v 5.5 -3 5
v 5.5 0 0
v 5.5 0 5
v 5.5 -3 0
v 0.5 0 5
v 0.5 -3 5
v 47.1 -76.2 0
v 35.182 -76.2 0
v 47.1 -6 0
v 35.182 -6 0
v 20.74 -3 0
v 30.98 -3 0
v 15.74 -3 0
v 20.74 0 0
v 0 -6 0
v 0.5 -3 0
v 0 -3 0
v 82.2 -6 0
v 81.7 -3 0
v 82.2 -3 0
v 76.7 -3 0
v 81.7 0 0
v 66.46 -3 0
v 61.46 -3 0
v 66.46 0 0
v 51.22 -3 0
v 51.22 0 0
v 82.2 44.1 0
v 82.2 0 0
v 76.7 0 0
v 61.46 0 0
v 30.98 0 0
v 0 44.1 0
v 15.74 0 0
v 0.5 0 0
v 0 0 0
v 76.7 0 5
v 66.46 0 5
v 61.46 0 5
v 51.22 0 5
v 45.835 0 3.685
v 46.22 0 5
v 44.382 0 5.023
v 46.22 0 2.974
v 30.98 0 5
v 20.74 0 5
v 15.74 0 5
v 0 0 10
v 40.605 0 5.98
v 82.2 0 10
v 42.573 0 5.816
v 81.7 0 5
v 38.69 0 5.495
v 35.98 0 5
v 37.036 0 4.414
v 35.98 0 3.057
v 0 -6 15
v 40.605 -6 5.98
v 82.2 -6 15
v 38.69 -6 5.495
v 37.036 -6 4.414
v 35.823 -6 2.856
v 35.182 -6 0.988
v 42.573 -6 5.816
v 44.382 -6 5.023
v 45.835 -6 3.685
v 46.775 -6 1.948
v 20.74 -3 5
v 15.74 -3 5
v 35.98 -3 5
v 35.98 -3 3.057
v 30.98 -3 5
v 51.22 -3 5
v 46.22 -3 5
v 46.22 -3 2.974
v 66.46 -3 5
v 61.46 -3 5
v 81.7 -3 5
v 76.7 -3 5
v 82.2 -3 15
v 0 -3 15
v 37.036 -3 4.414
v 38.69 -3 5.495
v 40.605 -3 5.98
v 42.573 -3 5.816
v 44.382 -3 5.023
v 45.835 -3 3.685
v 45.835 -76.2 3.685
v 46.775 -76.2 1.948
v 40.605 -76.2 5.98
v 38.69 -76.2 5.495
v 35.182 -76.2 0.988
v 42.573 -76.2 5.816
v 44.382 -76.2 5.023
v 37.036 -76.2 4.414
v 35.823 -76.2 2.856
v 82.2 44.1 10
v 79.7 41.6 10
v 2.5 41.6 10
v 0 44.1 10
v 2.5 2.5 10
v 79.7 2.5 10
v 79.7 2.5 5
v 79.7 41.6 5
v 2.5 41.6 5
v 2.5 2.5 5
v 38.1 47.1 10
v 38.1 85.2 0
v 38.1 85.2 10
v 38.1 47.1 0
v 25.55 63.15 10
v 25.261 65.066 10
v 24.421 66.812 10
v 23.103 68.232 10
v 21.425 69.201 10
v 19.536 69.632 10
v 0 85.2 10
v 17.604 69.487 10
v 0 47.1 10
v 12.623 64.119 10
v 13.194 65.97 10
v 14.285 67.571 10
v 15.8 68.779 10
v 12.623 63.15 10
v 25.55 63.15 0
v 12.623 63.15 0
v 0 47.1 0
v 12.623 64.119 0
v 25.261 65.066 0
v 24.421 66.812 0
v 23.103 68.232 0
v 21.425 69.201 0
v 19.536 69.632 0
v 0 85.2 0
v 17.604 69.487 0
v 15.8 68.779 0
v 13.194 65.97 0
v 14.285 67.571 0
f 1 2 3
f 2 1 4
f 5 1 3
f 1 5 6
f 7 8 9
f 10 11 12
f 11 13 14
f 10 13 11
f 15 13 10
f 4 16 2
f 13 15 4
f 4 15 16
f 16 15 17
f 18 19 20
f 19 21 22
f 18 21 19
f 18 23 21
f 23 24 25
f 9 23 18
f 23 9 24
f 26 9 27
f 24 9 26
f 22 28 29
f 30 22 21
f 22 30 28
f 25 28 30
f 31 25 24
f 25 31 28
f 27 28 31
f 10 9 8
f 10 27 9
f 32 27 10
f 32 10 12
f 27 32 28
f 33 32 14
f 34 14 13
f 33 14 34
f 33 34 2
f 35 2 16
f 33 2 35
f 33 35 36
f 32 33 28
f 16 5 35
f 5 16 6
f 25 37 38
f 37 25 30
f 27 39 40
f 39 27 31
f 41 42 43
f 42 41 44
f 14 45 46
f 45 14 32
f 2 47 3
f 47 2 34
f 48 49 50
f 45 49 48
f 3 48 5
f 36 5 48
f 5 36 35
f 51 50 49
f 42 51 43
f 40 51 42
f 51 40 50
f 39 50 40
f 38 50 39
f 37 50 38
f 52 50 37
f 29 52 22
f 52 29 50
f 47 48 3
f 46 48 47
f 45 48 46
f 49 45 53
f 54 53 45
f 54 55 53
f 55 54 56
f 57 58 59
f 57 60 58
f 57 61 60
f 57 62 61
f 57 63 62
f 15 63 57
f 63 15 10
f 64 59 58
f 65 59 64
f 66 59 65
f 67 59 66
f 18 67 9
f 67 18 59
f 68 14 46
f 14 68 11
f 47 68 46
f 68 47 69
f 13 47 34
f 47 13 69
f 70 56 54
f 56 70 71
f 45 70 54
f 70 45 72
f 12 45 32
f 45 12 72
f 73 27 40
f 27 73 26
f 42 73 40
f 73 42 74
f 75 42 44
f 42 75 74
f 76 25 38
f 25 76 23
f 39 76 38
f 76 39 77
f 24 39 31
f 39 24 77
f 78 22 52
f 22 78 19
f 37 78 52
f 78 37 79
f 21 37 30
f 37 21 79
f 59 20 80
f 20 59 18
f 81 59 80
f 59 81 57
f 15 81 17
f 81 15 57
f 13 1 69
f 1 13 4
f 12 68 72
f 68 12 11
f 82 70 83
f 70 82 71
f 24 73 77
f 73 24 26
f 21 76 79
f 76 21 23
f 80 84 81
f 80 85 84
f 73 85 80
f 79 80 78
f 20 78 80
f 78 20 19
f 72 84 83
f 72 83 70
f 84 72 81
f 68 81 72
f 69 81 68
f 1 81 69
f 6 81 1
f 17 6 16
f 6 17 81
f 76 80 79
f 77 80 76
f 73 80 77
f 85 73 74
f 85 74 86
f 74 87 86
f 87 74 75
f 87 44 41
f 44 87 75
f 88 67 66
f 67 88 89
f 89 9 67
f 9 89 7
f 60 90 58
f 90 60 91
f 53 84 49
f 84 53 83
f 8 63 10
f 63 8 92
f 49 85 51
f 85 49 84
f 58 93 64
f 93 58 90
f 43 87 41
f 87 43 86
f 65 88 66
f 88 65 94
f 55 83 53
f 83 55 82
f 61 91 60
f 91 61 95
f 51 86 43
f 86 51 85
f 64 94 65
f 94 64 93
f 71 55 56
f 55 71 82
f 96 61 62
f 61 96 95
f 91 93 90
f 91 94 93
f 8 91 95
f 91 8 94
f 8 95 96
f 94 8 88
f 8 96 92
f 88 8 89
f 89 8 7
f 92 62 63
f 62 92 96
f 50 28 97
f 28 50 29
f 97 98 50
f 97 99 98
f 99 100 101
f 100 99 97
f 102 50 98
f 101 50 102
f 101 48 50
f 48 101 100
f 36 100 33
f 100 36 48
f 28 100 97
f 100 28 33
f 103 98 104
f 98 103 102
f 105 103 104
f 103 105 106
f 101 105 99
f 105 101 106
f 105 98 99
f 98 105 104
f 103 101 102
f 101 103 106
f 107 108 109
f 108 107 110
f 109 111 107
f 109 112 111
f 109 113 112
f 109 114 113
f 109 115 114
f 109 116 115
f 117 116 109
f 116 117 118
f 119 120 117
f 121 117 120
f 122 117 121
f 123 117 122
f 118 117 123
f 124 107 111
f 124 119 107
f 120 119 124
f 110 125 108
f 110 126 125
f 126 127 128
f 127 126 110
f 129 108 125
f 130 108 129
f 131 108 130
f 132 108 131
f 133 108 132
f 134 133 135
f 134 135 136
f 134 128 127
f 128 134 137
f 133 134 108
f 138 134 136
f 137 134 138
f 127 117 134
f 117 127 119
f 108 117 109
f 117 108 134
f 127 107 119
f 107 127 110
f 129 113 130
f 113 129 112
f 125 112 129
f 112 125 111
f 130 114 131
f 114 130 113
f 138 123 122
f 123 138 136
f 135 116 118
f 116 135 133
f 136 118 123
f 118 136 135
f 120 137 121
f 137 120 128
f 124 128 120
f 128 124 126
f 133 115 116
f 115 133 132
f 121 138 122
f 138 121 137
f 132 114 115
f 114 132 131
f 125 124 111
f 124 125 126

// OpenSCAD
// Sign board
BOARD_LENGTH = 76.2;
BOARD_WIDTH = 38.1; //25.4;
BOARD_DEPTH = 5;    // This is a guess
WOOD_TOLERANCE = 1;

SIGN_BORDER = 3;
POST_HEIGHT = BOARD_LENGTH;
POST_DIAMETER = SIGN_BORDER * 2;
BASE_LENGTH = BOARD_LENGTH / 2;
BASE_WIDTH = BOARD_LENGTH / 2;//BOARD_WIDTH / 2;
BASE_DEPTH = BOARD_DEPTH * 2;
PLASTIC_TOLERANCE = 1;

// Sign top
difference(){
    
    union(){
        // Sign board holder
        cube([BOARD_LENGTH + (SIGN_BORDER * 2), BOARD_WIDTH + (SIGN_BORDER * 2), BOARD_DEPTH * 2]);
        
        // Lights
        translate([0, -SIGN_BORDER * 2,0]){
            
            // Connectors
            NUMBER_OF_CONNECTORS = 5;
            CONNECTOR_WIDTH = BOARD_LENGTH / NUMBER_OF_CONNECTORS;
            for (i = [0:NUMBER_OF_CONNECTORS]){
                translate([(i * CONNECTOR_WIDTH)+0.5, 0,0]){ // This +0.5 is weird but...?
                    cube([5,SIGN_BORDER * 2,BOARD_DEPTH]);
                }
            }
            
            // Light bar
            cube([BOARD_LENGTH + (SIGN_BORDER * 2), SIGN_BORDER, BOARD_DEPTH * 3]);
            
            // Post
            translate([(BOARD_LENGTH + (SIGN_BORDER * 2)) / 2,SIGN_BORDER * 2,0]){
                rotate([90,0,0]){
                    cylinder(r=POST_DIAMETER,h=POST_HEIGHT);
                }
            }
        }
    }
    
    // Cutout for sign board
    translate([SIGN_BORDER-(WOOD_TOLERANCE/2), SIGN_BORDER-(WOOD_TOLERANCE/2), BOARD_DEPTH]){
        cube([BOARD_LENGTH+WOOD_TOLERANCE, BOARD_WIDTH+WOOD_TOLERANCE, BOARD_DEPTH]);
    }
    
    // Cut-off everything below the ground plane
    translate([0,-POST_HEIGHT,-POST_DIAMETER]){
        cube([BOARD_LENGTH + (SIGN_BORDER * 2), BOARD_WIDTH + (SIGN_BORDER * 2) + POST_HEIGHT, POST_DIAMETER]);
    }
}

// Base
// TODO: Remove translate() and rotate() for printing (just here for preview)
translate([0,BOARD_WIDTH + (SIGN_BORDER * 3),0]){
//translate([((BOARD_LENGTH + (SIGN_BORDER * 2)) / 2)-(BASE_LENGTH/2),-POST_HEIGHT+BASE_DEPTH, -BASE_WIDTH/2]){
    //rotate([90,0,0]){
        difference(){
            cube([BASE_LENGTH, BASE_WIDTH, BASE_DEPTH]);
            
            translate([BASE_LENGTH/2, (BASE_WIDTH/2)-(POST_DIAMETER/2), 0]){
                cylinder(r=POST_DIAMETER+(PLASTIC_TOLERANCE/2), BASE_DEPTH);
            }
        }
        // Constrain hole into "D" shape
        #cube([BASE_LENGTH, (BASE_WIDTH/2)-(POST_DIAMETER/2), BASE_DEPTH]);
    //}
//}
}
